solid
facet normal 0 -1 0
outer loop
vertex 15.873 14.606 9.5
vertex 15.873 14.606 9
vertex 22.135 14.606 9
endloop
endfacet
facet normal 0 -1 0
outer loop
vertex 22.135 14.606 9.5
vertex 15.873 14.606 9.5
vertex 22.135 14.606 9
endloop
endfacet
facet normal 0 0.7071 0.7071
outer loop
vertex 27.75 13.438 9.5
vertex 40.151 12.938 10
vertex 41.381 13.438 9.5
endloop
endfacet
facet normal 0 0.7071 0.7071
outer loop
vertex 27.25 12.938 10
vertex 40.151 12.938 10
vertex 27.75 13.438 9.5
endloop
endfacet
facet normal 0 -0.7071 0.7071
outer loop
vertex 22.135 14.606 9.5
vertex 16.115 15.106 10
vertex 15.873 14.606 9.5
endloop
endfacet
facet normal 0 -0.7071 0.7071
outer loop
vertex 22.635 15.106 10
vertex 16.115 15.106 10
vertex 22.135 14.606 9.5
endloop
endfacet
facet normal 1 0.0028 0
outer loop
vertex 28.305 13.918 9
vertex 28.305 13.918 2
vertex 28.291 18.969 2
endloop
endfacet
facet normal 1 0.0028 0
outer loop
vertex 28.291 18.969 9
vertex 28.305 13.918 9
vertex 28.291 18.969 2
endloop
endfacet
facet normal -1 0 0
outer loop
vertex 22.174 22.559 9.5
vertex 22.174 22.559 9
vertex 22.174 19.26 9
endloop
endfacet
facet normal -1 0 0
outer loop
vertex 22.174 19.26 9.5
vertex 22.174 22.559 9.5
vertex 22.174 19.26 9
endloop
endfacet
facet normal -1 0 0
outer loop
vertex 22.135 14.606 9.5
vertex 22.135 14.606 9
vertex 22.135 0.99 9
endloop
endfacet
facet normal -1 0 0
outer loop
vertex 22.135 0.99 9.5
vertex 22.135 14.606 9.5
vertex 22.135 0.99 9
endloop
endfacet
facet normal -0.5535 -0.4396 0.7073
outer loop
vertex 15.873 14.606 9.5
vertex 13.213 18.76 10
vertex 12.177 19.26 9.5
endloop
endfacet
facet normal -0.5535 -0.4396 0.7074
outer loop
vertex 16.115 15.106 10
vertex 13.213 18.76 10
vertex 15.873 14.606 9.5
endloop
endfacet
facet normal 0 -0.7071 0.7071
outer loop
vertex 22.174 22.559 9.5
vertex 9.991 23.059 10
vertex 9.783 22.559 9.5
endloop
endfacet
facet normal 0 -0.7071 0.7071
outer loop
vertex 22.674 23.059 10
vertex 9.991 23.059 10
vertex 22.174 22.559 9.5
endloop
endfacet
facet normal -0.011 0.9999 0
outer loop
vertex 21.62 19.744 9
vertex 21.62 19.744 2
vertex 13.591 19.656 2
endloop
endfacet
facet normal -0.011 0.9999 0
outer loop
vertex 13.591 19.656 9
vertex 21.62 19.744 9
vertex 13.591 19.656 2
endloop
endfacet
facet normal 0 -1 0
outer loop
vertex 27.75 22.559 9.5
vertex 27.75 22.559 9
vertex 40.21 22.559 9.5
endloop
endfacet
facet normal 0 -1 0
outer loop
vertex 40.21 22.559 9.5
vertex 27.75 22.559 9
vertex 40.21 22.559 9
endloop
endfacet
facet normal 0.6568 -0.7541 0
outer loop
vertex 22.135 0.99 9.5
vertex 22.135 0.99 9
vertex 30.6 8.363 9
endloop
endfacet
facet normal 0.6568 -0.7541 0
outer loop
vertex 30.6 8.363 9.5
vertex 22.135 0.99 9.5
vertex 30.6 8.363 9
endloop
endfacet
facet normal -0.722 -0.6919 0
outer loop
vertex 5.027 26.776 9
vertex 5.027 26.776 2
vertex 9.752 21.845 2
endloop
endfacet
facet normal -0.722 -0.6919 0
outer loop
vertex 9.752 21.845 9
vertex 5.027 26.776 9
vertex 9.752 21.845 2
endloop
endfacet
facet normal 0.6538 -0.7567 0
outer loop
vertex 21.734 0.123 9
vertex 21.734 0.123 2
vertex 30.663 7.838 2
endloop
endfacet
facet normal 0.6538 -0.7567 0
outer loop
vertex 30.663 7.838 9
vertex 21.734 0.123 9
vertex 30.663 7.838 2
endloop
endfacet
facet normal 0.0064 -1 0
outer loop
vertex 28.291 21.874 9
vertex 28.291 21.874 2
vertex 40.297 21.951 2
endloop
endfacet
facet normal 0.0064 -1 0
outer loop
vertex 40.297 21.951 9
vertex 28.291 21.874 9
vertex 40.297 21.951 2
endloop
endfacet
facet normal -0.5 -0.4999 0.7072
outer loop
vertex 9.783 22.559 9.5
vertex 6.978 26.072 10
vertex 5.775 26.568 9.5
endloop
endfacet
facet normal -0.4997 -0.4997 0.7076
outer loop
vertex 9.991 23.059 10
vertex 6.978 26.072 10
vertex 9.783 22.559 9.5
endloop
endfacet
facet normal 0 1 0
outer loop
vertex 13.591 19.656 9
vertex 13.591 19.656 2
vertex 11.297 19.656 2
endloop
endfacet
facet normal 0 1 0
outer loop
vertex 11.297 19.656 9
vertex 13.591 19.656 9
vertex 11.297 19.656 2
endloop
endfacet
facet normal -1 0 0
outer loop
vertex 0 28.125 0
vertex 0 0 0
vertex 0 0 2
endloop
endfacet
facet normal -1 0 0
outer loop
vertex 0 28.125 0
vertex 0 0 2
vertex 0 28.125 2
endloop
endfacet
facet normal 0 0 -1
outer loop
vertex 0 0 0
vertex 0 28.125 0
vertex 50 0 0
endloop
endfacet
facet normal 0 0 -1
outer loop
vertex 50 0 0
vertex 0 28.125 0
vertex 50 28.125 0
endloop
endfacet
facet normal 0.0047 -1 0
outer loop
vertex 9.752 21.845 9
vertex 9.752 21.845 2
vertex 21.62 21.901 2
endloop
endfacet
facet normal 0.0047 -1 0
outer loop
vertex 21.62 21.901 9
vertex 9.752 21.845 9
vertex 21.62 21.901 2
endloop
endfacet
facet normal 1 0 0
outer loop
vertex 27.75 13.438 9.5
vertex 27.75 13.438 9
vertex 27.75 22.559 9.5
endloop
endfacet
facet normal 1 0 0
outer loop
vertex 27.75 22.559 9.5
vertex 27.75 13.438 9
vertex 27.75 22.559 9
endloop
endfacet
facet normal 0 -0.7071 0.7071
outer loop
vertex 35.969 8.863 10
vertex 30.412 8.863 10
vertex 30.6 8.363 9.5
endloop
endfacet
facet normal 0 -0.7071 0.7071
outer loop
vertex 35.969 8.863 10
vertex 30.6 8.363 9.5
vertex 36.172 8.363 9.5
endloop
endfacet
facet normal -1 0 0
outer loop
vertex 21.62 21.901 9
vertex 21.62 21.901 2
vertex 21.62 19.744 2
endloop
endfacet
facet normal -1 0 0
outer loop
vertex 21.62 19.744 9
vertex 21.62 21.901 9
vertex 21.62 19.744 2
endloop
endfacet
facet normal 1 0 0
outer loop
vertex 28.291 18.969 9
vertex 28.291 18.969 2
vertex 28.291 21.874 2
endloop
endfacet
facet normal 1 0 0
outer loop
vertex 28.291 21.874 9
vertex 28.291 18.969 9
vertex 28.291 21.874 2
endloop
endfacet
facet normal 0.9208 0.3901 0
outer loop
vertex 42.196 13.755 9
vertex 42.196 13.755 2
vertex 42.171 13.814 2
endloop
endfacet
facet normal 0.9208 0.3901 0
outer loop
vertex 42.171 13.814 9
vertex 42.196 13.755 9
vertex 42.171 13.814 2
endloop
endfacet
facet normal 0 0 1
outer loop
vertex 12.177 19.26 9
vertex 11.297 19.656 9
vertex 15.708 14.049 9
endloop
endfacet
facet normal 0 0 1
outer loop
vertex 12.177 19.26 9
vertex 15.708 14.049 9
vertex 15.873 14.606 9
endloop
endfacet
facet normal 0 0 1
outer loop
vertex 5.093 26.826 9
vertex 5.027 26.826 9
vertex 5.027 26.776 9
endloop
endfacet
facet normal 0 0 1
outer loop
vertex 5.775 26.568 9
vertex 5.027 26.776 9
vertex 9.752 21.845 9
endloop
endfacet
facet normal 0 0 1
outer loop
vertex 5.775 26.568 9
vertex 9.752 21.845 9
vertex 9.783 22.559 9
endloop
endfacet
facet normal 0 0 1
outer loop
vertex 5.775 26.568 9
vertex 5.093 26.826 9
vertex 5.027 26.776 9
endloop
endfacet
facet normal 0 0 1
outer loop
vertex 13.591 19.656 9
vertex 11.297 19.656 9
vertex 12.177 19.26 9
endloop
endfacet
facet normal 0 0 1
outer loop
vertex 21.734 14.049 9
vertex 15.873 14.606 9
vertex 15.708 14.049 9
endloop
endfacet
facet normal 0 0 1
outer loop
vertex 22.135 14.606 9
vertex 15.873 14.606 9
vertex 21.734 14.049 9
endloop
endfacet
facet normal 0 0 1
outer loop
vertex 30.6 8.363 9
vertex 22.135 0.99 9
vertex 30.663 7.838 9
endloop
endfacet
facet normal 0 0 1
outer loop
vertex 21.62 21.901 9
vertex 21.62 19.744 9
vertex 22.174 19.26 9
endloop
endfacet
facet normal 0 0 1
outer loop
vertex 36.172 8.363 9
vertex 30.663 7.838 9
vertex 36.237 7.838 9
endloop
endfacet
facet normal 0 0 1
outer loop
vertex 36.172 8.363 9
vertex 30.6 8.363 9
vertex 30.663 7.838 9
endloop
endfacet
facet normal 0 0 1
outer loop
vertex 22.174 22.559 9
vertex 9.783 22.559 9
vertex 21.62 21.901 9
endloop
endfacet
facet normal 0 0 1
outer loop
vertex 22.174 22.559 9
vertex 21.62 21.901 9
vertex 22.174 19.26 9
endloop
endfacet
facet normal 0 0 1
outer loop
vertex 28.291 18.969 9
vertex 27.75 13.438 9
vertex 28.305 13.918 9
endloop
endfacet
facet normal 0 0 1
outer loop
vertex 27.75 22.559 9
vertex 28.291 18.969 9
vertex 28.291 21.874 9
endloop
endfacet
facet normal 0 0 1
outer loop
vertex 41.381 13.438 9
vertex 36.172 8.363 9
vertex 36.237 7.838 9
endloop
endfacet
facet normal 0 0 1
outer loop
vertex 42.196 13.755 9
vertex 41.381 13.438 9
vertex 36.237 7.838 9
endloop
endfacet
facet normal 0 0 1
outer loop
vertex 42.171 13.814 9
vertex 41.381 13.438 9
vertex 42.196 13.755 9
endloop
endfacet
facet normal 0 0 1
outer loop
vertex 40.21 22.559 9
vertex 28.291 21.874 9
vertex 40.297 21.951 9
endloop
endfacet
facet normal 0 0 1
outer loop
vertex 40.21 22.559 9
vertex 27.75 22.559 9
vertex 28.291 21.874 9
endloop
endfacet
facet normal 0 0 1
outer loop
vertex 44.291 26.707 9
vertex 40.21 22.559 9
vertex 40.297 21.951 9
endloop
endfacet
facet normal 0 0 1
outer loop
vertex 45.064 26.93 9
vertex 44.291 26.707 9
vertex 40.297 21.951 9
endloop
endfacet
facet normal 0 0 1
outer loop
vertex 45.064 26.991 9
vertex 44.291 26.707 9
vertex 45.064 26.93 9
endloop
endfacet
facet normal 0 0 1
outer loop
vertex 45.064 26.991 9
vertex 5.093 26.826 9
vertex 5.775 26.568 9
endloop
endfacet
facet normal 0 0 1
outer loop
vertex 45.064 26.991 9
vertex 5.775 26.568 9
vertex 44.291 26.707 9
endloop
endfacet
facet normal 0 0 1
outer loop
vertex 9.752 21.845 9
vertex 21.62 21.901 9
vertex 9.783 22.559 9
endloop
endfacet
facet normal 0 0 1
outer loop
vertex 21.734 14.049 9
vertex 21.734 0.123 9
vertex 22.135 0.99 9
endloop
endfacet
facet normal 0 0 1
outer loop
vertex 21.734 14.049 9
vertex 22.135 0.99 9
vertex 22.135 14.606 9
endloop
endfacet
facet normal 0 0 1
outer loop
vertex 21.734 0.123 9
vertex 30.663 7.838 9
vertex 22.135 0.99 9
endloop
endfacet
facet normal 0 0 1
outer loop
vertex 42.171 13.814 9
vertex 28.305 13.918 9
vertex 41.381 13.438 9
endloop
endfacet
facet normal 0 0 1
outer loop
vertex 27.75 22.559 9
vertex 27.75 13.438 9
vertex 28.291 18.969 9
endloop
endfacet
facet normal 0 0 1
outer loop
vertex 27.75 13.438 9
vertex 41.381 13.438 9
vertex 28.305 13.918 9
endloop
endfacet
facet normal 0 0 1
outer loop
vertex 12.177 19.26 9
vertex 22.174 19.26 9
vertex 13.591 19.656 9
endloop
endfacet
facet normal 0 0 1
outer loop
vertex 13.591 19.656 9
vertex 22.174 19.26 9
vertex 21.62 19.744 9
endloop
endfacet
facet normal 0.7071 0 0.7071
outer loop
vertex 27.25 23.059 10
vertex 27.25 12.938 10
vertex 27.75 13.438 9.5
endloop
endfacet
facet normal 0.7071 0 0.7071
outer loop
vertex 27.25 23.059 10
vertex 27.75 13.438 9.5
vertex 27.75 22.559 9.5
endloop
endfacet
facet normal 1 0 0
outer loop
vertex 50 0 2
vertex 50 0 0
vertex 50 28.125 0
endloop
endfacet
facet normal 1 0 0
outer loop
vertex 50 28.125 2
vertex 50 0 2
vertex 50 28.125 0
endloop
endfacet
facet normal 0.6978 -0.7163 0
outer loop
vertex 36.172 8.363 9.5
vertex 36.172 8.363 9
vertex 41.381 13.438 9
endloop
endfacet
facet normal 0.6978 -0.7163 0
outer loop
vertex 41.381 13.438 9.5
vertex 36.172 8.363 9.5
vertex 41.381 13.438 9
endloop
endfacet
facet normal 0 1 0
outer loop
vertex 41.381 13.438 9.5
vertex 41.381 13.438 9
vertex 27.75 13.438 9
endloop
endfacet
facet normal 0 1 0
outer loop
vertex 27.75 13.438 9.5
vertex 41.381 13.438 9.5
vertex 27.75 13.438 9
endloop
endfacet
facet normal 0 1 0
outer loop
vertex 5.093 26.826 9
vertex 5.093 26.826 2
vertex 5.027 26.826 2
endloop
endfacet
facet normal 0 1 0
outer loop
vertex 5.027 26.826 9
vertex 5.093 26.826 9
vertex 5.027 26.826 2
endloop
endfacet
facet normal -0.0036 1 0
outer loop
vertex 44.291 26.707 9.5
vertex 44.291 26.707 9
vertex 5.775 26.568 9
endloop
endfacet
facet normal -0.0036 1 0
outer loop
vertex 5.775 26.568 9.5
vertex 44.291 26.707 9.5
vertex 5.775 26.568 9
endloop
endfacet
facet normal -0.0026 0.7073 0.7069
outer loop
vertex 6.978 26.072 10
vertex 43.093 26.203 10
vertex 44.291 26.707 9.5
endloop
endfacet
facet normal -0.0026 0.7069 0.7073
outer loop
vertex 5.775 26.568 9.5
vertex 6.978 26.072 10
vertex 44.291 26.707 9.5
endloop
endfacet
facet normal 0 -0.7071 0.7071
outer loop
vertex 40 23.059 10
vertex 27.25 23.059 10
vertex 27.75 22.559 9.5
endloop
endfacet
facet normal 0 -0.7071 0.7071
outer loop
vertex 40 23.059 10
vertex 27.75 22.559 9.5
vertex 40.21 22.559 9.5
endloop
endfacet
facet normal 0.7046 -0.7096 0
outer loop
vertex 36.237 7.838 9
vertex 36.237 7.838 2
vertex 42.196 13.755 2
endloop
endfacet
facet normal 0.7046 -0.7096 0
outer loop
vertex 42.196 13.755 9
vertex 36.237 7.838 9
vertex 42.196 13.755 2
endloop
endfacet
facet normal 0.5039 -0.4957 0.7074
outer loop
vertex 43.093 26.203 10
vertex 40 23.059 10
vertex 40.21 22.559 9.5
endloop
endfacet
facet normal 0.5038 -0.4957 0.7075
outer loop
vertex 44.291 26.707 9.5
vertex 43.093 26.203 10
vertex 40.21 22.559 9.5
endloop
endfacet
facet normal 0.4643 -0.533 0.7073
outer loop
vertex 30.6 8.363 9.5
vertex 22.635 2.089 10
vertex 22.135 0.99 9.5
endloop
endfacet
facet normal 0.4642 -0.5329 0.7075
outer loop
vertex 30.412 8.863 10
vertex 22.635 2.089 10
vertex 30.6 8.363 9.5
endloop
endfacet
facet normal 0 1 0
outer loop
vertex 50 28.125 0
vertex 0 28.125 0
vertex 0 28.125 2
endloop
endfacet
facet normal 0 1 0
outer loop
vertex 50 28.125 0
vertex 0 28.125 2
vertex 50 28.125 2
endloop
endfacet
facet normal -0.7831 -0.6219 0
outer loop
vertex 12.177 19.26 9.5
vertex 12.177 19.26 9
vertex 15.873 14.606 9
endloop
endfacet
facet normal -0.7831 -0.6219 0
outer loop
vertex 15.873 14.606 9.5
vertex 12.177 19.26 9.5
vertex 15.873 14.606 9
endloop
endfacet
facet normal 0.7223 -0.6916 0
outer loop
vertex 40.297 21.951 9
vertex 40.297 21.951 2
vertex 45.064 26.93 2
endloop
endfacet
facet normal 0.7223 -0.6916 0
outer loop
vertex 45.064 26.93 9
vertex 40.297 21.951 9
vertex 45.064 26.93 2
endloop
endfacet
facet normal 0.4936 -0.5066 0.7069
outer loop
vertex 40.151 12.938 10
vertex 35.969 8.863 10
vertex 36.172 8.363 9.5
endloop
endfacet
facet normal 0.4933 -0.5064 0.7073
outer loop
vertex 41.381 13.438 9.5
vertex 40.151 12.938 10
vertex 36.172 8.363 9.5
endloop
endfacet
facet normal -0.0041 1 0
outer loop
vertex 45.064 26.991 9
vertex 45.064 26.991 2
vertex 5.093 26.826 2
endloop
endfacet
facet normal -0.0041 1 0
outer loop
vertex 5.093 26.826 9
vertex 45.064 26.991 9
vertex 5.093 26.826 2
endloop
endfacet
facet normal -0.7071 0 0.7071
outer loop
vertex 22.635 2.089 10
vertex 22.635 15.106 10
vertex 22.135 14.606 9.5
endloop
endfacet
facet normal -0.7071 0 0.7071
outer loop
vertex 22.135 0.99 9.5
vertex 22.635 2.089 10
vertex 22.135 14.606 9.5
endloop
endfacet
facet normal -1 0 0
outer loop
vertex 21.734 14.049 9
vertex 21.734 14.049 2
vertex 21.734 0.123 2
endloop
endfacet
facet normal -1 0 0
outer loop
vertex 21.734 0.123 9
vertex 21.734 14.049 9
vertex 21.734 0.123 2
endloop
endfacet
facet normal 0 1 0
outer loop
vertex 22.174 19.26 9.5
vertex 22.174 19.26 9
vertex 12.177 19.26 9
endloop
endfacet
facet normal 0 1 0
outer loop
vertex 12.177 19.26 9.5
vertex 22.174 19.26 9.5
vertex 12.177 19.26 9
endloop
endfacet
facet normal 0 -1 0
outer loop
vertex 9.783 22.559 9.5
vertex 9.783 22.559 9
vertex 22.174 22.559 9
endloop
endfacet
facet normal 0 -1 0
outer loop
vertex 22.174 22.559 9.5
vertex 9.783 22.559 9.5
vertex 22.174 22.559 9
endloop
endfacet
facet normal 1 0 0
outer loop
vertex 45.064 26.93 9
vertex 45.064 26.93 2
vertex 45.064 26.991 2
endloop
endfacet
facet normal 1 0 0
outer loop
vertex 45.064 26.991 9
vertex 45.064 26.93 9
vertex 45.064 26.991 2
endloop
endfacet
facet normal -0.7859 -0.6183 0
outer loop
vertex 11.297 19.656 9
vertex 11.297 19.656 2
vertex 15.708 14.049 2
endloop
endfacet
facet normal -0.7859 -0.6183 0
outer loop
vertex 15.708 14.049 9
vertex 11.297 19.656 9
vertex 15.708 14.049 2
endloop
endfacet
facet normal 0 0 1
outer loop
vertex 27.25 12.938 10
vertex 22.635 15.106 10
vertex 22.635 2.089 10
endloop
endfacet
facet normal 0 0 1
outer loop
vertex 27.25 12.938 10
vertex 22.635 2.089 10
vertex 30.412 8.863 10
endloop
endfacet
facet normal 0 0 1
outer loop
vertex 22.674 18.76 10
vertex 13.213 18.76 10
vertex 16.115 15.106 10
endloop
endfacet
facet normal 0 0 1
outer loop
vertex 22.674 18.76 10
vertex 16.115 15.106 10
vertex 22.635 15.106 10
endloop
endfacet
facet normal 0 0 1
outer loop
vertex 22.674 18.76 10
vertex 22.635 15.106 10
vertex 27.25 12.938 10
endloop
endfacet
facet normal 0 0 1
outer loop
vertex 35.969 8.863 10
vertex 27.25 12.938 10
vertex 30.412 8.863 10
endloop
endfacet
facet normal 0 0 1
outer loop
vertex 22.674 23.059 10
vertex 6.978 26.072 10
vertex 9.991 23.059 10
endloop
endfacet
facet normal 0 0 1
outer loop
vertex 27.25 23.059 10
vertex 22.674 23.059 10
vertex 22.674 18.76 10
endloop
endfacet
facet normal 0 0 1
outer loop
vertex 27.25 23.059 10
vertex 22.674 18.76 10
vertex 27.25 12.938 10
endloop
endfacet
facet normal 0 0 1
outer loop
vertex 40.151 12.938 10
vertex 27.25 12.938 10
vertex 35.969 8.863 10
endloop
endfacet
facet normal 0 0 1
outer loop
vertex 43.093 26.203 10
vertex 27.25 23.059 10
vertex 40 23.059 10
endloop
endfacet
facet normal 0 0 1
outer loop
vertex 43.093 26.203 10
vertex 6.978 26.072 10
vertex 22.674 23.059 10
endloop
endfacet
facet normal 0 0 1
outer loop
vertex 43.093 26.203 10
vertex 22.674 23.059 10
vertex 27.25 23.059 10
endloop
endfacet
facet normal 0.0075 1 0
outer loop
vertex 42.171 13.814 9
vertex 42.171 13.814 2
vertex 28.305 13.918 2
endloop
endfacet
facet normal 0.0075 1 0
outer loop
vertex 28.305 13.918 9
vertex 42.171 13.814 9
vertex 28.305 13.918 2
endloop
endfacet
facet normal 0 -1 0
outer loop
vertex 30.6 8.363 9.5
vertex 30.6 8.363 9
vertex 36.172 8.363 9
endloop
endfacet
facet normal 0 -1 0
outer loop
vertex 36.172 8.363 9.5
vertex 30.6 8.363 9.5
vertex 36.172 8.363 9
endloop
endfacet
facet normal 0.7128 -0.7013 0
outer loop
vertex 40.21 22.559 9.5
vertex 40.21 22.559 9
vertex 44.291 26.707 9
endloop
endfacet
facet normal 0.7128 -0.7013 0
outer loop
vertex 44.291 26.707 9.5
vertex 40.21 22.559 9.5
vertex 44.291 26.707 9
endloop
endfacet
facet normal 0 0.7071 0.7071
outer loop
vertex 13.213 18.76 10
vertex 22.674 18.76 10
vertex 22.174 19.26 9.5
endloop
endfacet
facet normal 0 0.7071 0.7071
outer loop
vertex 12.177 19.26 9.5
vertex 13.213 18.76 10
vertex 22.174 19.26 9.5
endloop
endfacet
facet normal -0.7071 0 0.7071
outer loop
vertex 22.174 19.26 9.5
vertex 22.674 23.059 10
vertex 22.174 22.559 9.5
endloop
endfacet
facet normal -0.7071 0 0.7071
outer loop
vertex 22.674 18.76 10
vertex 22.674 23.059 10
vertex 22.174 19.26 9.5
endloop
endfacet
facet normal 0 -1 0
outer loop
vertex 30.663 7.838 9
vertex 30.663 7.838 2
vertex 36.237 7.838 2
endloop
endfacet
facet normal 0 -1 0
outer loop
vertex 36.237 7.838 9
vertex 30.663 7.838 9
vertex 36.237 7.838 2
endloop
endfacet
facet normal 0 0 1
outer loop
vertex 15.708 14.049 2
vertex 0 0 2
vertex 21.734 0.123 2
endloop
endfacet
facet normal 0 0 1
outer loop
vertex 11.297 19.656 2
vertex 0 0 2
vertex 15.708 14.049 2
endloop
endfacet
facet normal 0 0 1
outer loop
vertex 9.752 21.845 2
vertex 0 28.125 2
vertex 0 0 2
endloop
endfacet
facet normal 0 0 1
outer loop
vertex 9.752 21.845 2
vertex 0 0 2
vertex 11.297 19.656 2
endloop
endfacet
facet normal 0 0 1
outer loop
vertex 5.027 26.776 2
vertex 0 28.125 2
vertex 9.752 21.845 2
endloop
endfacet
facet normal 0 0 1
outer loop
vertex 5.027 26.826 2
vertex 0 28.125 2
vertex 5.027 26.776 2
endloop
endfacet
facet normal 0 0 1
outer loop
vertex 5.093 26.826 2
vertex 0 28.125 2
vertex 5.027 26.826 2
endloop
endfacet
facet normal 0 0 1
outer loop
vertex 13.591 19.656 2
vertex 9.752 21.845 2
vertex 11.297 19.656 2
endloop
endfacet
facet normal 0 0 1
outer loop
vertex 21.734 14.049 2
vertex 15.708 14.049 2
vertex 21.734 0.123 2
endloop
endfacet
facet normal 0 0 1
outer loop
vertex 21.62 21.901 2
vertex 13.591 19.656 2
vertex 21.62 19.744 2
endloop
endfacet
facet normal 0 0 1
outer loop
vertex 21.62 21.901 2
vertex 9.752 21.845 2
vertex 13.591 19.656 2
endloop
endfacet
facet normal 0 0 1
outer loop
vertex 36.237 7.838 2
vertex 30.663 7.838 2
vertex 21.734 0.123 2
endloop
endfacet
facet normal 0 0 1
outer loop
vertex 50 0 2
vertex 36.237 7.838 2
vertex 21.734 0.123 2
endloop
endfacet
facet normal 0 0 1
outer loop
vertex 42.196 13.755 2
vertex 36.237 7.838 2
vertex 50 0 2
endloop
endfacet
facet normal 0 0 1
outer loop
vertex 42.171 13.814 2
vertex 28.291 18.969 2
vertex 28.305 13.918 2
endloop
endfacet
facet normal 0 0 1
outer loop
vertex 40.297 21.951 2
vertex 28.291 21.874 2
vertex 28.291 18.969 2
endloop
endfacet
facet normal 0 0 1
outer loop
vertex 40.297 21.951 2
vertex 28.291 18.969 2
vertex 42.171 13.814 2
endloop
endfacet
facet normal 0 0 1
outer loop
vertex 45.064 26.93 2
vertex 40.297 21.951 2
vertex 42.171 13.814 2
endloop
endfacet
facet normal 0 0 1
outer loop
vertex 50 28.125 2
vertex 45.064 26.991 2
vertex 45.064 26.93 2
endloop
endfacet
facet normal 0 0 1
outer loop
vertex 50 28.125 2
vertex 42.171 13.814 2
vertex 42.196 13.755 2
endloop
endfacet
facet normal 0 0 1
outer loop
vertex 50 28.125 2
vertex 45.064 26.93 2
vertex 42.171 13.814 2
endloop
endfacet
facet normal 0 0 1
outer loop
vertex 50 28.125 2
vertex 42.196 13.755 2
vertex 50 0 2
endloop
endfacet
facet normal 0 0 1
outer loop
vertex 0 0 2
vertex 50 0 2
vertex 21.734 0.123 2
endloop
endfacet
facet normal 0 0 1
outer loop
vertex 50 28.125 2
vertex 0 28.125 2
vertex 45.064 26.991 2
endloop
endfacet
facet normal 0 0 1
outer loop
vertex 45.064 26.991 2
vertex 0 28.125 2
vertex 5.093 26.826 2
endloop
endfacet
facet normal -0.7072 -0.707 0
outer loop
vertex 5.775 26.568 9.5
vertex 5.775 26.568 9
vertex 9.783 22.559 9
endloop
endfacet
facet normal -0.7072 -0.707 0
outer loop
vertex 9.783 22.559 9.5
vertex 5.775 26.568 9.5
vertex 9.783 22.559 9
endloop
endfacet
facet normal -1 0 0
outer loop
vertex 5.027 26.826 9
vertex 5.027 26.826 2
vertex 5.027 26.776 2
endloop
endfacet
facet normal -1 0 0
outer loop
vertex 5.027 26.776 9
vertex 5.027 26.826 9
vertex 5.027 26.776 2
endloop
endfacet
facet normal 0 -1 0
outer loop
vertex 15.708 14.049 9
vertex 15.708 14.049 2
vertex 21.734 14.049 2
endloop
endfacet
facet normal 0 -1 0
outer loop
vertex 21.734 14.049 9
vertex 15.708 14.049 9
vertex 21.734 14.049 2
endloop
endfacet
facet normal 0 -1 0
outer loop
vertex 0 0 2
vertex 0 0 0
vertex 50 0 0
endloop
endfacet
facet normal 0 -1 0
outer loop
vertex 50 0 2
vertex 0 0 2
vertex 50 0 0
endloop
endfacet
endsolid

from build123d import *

# Parameters (mm, degrees)
F1_DEPTH = 9
F3_DEPTH = 10
F4_SIZE  = 0.5
F5_W     = 50
F5_H     = 28.125
F6_DEPTH = 2


with BuildPart() as f1:
    # F0 (on Top) → F1 (new body)
    with BuildSketch(Plane.XY):
        Polygon((45.063734, 26.990574), (5.092878, 26.825527), (5.026509, 26.825527), (5.026509, 26.775939), (9.752492, 21.845225), (21.620436, 21.900864), (21.620436, 19.744122), (13.590824, 19.655766), (11.297298, 19.655766), (15.708311, 14.049002), (21.73431, 14.049002), (21.73431, 13.644104), (21.73431, 0.123029), (30.663192, 7.83794), (36.236674, 7.83794), (42.195871, 13.755384), (42.170566, 13.813944), (28.305346, 13.917539), (28.29141, 18.968888), (28.29141, 21.87437), (40.296681, 21.950597), (45.063985, 26.929848), align=None)
    extrude(amount=F1_DEPTH)

    # F2 (on Top) → F3 (join)
    with BuildSketch(Plane.XY):
        Polygon((44.290613, 26.706943), (5.77521, 26.568018), (9.783478, 22.559412), (22.173569, 22.559412), (22.173569, 19.259503), (12.177236, 19.259503), (15.873199, 14.606038), (22.135269, 14.606038), (22.135269, 0.990343), (30.599596, 8.363117), (36.172263, 8.363117), (41.38108, 13.437884), (27.75046, 13.437884), (27.75046, 22.559412), (40.209763, 22.559412), align=None)
    extrude(amount=F3_DEPTH)

    # F4
    f4_edges = [f1.edges().sort_by_distance(p)[0] for p in [
        (22.135269, 7.798191, 10),
        (26.367432, 4.67673, 10),
        (33.38593, 8.363117, 10),
        (38.776672, 10.900501, 10),
        (34.56577, 13.437884, 10),
        (27.75046, 17.998648, 10),
        (33.980112, 22.559412, 10),
        (42.250188, 24.633178, 10),
        (25.032912, 26.637481, 10),
        (7.779344, 24.563715, 10),
        (15.978524, 22.559412, 10),
        (22.173569, 20.909457, 10),
        (17.175402, 19.259503, 10),
        (14.025218, 16.932771, 10),
        (19.004234, 14.606038, 10),
    ]]
    chamfer(f4_edges, length=F4_SIZE)

    # F5 (on Top) → F6 (join)
    with BuildSketch(Plane.XY):
        with Locations((25, 14.0625)):
            Rectangle(F5_W, F5_H)
    extrude(amount=F6_DEPTH)


solid = f1.part
